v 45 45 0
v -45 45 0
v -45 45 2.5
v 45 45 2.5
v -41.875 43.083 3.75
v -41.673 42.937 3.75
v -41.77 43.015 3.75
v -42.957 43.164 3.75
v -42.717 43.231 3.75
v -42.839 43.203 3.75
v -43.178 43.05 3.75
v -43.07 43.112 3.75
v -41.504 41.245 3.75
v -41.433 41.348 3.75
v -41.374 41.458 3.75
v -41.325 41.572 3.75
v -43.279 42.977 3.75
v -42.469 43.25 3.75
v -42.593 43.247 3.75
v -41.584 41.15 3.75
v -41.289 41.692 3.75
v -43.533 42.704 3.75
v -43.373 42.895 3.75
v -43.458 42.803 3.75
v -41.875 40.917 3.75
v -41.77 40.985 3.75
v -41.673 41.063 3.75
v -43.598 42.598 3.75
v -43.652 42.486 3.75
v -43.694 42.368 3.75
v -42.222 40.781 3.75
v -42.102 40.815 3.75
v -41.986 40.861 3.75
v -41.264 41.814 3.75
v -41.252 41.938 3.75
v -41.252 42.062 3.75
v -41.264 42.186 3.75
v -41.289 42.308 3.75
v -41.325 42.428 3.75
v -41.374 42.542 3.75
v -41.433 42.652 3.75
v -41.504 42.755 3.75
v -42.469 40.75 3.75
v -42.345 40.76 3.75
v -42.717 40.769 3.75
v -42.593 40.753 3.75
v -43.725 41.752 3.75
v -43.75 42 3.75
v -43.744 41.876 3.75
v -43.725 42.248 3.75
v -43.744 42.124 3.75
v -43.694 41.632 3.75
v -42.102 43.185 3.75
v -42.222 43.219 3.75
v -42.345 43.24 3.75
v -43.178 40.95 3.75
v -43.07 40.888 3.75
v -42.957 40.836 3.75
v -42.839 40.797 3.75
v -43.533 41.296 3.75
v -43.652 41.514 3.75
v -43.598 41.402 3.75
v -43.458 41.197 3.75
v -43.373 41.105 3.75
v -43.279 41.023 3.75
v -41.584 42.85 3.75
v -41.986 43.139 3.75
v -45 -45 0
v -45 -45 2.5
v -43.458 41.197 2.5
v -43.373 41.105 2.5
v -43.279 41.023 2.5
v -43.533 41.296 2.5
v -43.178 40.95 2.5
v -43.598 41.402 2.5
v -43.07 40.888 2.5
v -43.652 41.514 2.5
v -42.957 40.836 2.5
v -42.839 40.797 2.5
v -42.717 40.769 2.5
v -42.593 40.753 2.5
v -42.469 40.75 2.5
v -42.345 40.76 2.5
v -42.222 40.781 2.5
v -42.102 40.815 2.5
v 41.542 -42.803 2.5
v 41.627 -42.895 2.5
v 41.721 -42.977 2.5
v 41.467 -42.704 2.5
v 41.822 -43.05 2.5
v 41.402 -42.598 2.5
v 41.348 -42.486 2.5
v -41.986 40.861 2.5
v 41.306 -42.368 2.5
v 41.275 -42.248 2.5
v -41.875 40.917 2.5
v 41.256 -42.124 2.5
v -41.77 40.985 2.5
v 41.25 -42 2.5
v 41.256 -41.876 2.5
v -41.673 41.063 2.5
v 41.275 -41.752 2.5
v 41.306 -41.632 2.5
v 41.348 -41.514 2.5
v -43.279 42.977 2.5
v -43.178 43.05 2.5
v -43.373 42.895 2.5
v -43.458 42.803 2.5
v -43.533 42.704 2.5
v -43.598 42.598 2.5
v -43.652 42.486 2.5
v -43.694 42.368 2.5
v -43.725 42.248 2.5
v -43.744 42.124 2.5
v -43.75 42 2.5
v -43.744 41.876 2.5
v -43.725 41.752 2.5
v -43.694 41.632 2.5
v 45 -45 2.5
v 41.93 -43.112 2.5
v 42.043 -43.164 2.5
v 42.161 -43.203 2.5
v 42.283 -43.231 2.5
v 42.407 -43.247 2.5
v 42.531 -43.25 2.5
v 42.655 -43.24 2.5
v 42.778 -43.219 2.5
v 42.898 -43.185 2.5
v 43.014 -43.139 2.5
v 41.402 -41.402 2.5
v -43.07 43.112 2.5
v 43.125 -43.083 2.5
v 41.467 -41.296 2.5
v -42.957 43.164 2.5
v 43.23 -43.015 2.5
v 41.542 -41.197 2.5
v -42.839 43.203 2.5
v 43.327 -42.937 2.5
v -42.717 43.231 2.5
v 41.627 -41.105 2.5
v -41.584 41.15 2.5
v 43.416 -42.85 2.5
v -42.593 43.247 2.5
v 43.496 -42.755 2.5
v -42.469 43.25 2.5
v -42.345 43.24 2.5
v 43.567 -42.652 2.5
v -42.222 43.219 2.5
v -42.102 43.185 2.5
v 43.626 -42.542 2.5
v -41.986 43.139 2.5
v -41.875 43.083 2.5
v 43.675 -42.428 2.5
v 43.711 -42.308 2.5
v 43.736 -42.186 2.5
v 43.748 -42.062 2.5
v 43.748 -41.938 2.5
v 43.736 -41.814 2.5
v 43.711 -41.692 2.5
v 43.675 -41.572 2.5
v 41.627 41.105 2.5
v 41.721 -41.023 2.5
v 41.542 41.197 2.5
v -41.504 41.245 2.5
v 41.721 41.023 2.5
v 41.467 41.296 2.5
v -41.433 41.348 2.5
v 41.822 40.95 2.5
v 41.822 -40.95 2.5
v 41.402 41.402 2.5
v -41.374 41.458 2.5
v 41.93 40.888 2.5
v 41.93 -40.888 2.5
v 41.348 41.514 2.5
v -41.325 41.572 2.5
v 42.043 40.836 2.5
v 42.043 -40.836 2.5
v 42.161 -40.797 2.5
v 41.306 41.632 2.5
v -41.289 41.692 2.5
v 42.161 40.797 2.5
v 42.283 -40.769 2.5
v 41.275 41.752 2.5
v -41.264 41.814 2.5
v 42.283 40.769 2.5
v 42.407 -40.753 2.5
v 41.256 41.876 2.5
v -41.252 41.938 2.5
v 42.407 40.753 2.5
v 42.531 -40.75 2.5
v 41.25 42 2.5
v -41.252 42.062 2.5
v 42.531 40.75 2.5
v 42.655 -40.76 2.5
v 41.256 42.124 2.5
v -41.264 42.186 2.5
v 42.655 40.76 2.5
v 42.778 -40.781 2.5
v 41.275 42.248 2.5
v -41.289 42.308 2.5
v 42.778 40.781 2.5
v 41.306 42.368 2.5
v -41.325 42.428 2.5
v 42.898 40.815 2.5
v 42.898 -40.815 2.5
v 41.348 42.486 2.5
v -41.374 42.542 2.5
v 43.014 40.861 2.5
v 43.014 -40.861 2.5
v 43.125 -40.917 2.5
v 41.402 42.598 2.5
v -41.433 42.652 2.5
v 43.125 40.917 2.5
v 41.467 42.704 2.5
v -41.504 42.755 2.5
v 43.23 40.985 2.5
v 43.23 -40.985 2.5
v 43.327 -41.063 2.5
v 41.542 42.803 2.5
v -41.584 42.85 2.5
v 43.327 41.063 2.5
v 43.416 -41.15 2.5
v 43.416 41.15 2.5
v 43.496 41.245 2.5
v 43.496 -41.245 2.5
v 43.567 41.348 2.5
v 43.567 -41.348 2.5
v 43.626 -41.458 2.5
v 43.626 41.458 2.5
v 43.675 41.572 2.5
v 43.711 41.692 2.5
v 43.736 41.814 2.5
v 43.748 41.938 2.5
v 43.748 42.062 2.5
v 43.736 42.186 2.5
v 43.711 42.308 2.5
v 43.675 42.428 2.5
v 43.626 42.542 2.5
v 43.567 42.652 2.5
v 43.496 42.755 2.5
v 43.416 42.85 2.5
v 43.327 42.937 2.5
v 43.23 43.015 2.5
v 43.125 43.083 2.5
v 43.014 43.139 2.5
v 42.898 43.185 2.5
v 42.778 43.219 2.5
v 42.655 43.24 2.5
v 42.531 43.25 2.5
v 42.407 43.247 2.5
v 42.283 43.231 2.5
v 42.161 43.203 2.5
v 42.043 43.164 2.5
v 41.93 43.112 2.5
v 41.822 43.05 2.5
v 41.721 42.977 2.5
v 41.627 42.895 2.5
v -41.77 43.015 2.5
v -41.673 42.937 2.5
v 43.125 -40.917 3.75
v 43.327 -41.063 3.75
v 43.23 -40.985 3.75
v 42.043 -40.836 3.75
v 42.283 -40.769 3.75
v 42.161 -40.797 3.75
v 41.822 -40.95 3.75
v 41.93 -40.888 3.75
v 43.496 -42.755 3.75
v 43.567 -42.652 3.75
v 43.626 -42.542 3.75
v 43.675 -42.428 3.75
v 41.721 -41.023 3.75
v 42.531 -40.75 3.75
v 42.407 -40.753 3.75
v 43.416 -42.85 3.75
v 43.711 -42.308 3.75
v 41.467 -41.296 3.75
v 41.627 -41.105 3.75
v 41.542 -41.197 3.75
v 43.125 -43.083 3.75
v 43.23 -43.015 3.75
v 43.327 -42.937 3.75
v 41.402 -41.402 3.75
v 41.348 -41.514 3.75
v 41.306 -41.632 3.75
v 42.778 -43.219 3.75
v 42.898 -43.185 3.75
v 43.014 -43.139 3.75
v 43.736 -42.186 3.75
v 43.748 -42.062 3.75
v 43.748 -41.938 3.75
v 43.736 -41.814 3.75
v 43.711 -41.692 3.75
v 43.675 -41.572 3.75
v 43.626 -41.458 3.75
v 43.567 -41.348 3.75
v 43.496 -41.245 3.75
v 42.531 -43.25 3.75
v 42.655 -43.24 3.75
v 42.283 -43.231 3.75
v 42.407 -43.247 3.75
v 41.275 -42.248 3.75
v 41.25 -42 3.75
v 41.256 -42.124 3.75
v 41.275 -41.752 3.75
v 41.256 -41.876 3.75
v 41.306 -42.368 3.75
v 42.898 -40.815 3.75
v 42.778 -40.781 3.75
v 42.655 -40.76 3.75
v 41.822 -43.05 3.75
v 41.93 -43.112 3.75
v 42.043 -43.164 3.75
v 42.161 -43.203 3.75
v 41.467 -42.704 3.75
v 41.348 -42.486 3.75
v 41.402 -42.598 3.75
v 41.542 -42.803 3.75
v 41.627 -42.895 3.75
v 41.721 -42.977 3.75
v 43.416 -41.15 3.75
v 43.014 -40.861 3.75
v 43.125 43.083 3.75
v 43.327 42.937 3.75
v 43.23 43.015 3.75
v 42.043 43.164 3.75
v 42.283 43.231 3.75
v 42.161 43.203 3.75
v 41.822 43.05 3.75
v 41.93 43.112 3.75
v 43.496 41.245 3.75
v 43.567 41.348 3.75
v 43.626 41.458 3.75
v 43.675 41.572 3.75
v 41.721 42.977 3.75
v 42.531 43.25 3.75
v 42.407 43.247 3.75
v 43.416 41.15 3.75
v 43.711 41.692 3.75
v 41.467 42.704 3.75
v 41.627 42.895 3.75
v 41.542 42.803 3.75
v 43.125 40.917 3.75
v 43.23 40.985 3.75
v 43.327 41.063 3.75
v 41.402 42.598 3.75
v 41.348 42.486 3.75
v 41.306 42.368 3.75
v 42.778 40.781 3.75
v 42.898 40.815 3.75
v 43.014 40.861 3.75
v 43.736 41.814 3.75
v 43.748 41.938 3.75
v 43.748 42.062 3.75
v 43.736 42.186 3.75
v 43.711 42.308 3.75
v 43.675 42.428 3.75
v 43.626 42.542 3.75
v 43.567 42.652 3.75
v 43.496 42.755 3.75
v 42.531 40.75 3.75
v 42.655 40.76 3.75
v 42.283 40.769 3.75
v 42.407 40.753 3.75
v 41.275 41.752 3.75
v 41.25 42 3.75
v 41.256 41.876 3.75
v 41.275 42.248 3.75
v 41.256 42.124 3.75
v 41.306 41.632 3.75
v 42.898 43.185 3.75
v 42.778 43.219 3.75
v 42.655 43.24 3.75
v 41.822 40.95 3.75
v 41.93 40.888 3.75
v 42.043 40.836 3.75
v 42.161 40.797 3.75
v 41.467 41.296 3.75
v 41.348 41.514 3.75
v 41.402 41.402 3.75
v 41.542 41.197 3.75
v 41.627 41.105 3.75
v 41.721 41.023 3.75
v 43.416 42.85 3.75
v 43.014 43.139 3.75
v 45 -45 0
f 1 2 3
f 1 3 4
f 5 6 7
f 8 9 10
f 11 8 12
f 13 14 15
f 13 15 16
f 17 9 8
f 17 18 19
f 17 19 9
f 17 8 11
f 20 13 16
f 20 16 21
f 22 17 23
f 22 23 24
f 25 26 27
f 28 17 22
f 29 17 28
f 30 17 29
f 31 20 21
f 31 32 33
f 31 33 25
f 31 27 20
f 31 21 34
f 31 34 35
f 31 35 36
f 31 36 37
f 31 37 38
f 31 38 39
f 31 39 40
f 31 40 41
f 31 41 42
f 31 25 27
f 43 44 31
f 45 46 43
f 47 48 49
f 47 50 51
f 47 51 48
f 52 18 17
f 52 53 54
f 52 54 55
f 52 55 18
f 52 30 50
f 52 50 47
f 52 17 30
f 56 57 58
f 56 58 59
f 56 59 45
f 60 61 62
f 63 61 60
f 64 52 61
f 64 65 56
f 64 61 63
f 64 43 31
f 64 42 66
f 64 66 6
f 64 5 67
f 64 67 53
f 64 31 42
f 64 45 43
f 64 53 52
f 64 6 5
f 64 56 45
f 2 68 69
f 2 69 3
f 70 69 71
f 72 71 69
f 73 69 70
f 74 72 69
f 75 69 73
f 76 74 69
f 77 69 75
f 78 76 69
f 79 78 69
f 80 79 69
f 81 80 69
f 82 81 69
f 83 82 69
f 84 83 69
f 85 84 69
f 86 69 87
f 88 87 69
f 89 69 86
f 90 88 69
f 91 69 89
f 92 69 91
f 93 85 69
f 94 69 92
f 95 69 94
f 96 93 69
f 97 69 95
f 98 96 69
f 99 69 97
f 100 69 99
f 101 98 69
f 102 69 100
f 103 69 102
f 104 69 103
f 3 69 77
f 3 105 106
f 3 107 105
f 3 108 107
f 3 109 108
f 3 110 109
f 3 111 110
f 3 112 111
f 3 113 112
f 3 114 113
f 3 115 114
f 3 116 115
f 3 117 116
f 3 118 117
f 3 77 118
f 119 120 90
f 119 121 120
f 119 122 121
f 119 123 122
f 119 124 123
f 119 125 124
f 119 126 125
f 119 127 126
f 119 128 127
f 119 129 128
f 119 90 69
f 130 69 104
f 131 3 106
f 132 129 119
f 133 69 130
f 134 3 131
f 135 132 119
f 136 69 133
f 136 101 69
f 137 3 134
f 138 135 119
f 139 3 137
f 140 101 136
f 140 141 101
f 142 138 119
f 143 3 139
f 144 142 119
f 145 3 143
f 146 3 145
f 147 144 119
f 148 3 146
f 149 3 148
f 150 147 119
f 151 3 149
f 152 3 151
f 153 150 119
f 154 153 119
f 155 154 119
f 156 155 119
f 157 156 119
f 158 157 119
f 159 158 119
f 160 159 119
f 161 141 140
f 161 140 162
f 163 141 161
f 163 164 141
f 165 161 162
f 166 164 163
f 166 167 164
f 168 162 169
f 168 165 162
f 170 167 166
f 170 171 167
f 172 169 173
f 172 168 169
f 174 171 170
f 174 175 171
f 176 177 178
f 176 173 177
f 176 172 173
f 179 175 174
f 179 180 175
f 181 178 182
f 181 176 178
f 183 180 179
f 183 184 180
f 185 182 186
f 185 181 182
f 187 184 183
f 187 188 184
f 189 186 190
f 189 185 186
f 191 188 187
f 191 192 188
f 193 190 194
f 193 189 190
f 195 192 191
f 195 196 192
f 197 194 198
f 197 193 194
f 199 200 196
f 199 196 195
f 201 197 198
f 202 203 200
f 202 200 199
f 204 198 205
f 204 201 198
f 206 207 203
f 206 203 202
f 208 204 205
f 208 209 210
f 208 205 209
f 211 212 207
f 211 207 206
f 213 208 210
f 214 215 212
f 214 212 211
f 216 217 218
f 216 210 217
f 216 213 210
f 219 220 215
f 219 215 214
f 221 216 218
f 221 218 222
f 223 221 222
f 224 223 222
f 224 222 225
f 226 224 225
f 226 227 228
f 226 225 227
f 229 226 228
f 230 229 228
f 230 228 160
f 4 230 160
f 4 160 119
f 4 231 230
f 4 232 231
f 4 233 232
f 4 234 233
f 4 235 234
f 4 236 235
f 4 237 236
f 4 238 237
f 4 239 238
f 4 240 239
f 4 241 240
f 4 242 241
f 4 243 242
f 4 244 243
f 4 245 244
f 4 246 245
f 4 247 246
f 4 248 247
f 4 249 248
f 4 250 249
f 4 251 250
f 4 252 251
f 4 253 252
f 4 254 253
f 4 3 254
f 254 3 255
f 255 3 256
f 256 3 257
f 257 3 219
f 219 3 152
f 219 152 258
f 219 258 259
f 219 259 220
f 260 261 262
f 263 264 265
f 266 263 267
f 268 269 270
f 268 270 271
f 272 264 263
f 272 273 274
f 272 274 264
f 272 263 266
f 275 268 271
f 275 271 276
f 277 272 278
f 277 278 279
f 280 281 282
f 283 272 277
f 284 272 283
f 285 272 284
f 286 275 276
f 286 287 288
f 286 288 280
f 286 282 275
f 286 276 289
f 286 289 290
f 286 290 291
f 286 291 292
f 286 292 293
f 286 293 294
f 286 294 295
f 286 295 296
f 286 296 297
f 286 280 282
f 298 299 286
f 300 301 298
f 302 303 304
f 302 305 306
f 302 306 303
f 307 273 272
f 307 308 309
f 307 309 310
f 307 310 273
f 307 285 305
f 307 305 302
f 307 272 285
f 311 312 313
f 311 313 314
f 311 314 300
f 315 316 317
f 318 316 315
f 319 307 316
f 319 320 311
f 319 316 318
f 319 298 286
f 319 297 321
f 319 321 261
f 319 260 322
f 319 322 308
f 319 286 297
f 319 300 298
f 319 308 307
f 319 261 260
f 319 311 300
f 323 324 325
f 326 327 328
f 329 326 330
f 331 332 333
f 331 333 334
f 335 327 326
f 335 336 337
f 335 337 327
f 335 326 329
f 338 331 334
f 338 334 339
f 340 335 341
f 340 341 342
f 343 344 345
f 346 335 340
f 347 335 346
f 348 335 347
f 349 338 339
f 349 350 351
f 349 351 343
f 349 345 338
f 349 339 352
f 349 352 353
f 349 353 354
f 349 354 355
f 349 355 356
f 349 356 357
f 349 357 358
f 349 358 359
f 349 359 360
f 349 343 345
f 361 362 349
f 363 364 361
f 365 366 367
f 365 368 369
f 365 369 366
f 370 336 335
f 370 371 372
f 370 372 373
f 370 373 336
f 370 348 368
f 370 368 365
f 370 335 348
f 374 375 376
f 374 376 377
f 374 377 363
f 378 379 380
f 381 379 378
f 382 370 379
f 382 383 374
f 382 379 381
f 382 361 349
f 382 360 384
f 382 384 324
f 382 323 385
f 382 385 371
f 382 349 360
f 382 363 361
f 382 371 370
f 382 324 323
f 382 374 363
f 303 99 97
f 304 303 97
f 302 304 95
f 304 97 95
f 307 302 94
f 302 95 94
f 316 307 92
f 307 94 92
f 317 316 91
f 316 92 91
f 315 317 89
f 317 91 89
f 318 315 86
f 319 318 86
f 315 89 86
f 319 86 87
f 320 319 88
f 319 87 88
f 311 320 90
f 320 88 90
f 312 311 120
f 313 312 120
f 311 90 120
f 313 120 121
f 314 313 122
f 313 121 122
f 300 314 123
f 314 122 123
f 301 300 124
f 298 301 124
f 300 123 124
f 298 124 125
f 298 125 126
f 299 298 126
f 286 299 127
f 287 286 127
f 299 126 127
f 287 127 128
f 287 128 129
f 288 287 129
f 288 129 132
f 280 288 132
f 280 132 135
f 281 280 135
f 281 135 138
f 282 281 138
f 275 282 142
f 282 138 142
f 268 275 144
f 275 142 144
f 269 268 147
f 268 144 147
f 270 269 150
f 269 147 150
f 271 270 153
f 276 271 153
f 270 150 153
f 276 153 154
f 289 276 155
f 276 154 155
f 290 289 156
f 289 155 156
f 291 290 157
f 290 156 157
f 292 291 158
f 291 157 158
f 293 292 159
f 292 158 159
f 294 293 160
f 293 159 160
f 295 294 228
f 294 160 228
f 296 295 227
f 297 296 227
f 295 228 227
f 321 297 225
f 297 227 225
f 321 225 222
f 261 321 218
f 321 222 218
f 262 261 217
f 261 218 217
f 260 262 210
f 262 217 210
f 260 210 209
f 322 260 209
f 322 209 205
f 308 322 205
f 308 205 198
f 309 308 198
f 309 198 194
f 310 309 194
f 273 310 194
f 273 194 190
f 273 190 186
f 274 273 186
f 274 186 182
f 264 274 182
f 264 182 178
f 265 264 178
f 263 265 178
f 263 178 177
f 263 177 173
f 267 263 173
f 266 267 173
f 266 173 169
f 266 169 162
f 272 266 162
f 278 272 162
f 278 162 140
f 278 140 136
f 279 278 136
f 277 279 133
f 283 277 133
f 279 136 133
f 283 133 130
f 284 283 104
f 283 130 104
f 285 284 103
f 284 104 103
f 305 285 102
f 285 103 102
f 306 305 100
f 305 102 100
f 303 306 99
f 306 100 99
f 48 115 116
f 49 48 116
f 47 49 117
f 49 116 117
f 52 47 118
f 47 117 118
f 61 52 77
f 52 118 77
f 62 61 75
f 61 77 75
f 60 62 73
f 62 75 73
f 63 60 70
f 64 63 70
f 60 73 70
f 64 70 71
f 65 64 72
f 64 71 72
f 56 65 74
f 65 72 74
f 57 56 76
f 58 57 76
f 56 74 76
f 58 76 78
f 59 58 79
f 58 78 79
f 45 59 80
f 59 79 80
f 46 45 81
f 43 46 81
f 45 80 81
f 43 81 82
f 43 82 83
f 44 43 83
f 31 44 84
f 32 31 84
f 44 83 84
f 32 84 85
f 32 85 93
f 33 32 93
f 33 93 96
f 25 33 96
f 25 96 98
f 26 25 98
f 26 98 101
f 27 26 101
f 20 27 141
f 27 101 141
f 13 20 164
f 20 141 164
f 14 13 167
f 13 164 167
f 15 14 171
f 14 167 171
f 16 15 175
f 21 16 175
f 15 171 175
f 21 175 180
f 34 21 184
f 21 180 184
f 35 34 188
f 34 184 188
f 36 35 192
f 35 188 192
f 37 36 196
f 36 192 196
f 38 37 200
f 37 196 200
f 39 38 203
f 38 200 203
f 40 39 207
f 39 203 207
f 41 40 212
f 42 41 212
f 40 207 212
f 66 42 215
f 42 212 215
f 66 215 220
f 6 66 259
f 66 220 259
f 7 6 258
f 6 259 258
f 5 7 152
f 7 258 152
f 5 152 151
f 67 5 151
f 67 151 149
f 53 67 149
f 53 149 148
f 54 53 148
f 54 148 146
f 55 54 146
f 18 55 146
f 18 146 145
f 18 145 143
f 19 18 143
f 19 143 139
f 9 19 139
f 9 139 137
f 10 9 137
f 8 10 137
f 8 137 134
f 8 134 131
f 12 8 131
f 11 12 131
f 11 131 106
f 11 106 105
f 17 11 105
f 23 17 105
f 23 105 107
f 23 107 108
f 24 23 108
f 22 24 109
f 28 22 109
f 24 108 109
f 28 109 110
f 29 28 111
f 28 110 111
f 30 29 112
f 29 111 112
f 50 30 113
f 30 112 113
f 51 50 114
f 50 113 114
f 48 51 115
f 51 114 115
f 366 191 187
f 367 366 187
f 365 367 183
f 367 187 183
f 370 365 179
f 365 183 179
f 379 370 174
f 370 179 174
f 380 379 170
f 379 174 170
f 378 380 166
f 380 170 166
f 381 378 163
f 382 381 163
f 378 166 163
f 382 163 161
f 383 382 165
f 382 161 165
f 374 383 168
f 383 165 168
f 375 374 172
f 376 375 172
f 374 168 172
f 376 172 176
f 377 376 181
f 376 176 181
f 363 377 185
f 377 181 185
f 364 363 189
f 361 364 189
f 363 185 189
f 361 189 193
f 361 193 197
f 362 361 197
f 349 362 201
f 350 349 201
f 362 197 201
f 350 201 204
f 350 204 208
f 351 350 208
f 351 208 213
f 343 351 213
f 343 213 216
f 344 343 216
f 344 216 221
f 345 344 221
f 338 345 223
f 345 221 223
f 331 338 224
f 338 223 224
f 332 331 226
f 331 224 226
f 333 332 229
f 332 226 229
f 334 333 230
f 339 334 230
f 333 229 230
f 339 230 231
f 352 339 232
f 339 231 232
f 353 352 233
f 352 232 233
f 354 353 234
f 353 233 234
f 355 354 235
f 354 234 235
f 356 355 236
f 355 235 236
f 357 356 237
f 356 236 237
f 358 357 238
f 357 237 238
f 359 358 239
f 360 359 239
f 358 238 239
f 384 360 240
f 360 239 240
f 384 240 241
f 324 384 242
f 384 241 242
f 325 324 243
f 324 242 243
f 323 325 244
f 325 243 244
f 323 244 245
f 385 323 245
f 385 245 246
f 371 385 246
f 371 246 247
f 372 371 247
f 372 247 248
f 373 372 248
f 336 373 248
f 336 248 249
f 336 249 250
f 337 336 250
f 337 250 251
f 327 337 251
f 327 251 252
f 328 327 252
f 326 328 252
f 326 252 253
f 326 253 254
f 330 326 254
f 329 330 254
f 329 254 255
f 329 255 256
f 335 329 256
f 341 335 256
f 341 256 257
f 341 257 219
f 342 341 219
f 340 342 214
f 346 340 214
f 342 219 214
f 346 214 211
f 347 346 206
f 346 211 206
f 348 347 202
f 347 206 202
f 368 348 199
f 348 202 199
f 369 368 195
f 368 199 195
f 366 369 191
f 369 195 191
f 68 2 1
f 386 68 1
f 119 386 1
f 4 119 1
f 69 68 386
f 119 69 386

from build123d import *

# Parameters (mm, degrees)
SKETCH1_W           = 90
SKETCH1_H           = 90
BOSS_EXTRUDE1_DEPTH = 2.5
SKETCH2_R           = 1.25
BOSS_EXTRUDE2_DEPTH = 1.25


with BuildPart() as part:
    # Sketch1 → Boss-Extrude1 (new body)
    with BuildSketch(Plane.XY):
        Rectangle(SKETCH1_W, SKETCH1_H)
    extrude(amount=BOSS_EXTRUDE1_DEPTH)

    # Sketch2 → Boss-Extrude2 (add)
    with BuildSketch(Plane.XY.offset(2.5)):
        with Locations(Location((-42.5, 42, 0), (0, 0, 180))):
            Circle(SKETCH2_R)
        with Locations(Location((42.5, 42, 0), (0, 0, 180))):
            Circle(SKETCH2_R)
        with Locations(Location((42.5, -42, 0), (0, 0, 180))):
            Circle(SKETCH2_R)
    extrude(amount=BOSS_EXTRUDE2_DEPTH)


solid = part.part
